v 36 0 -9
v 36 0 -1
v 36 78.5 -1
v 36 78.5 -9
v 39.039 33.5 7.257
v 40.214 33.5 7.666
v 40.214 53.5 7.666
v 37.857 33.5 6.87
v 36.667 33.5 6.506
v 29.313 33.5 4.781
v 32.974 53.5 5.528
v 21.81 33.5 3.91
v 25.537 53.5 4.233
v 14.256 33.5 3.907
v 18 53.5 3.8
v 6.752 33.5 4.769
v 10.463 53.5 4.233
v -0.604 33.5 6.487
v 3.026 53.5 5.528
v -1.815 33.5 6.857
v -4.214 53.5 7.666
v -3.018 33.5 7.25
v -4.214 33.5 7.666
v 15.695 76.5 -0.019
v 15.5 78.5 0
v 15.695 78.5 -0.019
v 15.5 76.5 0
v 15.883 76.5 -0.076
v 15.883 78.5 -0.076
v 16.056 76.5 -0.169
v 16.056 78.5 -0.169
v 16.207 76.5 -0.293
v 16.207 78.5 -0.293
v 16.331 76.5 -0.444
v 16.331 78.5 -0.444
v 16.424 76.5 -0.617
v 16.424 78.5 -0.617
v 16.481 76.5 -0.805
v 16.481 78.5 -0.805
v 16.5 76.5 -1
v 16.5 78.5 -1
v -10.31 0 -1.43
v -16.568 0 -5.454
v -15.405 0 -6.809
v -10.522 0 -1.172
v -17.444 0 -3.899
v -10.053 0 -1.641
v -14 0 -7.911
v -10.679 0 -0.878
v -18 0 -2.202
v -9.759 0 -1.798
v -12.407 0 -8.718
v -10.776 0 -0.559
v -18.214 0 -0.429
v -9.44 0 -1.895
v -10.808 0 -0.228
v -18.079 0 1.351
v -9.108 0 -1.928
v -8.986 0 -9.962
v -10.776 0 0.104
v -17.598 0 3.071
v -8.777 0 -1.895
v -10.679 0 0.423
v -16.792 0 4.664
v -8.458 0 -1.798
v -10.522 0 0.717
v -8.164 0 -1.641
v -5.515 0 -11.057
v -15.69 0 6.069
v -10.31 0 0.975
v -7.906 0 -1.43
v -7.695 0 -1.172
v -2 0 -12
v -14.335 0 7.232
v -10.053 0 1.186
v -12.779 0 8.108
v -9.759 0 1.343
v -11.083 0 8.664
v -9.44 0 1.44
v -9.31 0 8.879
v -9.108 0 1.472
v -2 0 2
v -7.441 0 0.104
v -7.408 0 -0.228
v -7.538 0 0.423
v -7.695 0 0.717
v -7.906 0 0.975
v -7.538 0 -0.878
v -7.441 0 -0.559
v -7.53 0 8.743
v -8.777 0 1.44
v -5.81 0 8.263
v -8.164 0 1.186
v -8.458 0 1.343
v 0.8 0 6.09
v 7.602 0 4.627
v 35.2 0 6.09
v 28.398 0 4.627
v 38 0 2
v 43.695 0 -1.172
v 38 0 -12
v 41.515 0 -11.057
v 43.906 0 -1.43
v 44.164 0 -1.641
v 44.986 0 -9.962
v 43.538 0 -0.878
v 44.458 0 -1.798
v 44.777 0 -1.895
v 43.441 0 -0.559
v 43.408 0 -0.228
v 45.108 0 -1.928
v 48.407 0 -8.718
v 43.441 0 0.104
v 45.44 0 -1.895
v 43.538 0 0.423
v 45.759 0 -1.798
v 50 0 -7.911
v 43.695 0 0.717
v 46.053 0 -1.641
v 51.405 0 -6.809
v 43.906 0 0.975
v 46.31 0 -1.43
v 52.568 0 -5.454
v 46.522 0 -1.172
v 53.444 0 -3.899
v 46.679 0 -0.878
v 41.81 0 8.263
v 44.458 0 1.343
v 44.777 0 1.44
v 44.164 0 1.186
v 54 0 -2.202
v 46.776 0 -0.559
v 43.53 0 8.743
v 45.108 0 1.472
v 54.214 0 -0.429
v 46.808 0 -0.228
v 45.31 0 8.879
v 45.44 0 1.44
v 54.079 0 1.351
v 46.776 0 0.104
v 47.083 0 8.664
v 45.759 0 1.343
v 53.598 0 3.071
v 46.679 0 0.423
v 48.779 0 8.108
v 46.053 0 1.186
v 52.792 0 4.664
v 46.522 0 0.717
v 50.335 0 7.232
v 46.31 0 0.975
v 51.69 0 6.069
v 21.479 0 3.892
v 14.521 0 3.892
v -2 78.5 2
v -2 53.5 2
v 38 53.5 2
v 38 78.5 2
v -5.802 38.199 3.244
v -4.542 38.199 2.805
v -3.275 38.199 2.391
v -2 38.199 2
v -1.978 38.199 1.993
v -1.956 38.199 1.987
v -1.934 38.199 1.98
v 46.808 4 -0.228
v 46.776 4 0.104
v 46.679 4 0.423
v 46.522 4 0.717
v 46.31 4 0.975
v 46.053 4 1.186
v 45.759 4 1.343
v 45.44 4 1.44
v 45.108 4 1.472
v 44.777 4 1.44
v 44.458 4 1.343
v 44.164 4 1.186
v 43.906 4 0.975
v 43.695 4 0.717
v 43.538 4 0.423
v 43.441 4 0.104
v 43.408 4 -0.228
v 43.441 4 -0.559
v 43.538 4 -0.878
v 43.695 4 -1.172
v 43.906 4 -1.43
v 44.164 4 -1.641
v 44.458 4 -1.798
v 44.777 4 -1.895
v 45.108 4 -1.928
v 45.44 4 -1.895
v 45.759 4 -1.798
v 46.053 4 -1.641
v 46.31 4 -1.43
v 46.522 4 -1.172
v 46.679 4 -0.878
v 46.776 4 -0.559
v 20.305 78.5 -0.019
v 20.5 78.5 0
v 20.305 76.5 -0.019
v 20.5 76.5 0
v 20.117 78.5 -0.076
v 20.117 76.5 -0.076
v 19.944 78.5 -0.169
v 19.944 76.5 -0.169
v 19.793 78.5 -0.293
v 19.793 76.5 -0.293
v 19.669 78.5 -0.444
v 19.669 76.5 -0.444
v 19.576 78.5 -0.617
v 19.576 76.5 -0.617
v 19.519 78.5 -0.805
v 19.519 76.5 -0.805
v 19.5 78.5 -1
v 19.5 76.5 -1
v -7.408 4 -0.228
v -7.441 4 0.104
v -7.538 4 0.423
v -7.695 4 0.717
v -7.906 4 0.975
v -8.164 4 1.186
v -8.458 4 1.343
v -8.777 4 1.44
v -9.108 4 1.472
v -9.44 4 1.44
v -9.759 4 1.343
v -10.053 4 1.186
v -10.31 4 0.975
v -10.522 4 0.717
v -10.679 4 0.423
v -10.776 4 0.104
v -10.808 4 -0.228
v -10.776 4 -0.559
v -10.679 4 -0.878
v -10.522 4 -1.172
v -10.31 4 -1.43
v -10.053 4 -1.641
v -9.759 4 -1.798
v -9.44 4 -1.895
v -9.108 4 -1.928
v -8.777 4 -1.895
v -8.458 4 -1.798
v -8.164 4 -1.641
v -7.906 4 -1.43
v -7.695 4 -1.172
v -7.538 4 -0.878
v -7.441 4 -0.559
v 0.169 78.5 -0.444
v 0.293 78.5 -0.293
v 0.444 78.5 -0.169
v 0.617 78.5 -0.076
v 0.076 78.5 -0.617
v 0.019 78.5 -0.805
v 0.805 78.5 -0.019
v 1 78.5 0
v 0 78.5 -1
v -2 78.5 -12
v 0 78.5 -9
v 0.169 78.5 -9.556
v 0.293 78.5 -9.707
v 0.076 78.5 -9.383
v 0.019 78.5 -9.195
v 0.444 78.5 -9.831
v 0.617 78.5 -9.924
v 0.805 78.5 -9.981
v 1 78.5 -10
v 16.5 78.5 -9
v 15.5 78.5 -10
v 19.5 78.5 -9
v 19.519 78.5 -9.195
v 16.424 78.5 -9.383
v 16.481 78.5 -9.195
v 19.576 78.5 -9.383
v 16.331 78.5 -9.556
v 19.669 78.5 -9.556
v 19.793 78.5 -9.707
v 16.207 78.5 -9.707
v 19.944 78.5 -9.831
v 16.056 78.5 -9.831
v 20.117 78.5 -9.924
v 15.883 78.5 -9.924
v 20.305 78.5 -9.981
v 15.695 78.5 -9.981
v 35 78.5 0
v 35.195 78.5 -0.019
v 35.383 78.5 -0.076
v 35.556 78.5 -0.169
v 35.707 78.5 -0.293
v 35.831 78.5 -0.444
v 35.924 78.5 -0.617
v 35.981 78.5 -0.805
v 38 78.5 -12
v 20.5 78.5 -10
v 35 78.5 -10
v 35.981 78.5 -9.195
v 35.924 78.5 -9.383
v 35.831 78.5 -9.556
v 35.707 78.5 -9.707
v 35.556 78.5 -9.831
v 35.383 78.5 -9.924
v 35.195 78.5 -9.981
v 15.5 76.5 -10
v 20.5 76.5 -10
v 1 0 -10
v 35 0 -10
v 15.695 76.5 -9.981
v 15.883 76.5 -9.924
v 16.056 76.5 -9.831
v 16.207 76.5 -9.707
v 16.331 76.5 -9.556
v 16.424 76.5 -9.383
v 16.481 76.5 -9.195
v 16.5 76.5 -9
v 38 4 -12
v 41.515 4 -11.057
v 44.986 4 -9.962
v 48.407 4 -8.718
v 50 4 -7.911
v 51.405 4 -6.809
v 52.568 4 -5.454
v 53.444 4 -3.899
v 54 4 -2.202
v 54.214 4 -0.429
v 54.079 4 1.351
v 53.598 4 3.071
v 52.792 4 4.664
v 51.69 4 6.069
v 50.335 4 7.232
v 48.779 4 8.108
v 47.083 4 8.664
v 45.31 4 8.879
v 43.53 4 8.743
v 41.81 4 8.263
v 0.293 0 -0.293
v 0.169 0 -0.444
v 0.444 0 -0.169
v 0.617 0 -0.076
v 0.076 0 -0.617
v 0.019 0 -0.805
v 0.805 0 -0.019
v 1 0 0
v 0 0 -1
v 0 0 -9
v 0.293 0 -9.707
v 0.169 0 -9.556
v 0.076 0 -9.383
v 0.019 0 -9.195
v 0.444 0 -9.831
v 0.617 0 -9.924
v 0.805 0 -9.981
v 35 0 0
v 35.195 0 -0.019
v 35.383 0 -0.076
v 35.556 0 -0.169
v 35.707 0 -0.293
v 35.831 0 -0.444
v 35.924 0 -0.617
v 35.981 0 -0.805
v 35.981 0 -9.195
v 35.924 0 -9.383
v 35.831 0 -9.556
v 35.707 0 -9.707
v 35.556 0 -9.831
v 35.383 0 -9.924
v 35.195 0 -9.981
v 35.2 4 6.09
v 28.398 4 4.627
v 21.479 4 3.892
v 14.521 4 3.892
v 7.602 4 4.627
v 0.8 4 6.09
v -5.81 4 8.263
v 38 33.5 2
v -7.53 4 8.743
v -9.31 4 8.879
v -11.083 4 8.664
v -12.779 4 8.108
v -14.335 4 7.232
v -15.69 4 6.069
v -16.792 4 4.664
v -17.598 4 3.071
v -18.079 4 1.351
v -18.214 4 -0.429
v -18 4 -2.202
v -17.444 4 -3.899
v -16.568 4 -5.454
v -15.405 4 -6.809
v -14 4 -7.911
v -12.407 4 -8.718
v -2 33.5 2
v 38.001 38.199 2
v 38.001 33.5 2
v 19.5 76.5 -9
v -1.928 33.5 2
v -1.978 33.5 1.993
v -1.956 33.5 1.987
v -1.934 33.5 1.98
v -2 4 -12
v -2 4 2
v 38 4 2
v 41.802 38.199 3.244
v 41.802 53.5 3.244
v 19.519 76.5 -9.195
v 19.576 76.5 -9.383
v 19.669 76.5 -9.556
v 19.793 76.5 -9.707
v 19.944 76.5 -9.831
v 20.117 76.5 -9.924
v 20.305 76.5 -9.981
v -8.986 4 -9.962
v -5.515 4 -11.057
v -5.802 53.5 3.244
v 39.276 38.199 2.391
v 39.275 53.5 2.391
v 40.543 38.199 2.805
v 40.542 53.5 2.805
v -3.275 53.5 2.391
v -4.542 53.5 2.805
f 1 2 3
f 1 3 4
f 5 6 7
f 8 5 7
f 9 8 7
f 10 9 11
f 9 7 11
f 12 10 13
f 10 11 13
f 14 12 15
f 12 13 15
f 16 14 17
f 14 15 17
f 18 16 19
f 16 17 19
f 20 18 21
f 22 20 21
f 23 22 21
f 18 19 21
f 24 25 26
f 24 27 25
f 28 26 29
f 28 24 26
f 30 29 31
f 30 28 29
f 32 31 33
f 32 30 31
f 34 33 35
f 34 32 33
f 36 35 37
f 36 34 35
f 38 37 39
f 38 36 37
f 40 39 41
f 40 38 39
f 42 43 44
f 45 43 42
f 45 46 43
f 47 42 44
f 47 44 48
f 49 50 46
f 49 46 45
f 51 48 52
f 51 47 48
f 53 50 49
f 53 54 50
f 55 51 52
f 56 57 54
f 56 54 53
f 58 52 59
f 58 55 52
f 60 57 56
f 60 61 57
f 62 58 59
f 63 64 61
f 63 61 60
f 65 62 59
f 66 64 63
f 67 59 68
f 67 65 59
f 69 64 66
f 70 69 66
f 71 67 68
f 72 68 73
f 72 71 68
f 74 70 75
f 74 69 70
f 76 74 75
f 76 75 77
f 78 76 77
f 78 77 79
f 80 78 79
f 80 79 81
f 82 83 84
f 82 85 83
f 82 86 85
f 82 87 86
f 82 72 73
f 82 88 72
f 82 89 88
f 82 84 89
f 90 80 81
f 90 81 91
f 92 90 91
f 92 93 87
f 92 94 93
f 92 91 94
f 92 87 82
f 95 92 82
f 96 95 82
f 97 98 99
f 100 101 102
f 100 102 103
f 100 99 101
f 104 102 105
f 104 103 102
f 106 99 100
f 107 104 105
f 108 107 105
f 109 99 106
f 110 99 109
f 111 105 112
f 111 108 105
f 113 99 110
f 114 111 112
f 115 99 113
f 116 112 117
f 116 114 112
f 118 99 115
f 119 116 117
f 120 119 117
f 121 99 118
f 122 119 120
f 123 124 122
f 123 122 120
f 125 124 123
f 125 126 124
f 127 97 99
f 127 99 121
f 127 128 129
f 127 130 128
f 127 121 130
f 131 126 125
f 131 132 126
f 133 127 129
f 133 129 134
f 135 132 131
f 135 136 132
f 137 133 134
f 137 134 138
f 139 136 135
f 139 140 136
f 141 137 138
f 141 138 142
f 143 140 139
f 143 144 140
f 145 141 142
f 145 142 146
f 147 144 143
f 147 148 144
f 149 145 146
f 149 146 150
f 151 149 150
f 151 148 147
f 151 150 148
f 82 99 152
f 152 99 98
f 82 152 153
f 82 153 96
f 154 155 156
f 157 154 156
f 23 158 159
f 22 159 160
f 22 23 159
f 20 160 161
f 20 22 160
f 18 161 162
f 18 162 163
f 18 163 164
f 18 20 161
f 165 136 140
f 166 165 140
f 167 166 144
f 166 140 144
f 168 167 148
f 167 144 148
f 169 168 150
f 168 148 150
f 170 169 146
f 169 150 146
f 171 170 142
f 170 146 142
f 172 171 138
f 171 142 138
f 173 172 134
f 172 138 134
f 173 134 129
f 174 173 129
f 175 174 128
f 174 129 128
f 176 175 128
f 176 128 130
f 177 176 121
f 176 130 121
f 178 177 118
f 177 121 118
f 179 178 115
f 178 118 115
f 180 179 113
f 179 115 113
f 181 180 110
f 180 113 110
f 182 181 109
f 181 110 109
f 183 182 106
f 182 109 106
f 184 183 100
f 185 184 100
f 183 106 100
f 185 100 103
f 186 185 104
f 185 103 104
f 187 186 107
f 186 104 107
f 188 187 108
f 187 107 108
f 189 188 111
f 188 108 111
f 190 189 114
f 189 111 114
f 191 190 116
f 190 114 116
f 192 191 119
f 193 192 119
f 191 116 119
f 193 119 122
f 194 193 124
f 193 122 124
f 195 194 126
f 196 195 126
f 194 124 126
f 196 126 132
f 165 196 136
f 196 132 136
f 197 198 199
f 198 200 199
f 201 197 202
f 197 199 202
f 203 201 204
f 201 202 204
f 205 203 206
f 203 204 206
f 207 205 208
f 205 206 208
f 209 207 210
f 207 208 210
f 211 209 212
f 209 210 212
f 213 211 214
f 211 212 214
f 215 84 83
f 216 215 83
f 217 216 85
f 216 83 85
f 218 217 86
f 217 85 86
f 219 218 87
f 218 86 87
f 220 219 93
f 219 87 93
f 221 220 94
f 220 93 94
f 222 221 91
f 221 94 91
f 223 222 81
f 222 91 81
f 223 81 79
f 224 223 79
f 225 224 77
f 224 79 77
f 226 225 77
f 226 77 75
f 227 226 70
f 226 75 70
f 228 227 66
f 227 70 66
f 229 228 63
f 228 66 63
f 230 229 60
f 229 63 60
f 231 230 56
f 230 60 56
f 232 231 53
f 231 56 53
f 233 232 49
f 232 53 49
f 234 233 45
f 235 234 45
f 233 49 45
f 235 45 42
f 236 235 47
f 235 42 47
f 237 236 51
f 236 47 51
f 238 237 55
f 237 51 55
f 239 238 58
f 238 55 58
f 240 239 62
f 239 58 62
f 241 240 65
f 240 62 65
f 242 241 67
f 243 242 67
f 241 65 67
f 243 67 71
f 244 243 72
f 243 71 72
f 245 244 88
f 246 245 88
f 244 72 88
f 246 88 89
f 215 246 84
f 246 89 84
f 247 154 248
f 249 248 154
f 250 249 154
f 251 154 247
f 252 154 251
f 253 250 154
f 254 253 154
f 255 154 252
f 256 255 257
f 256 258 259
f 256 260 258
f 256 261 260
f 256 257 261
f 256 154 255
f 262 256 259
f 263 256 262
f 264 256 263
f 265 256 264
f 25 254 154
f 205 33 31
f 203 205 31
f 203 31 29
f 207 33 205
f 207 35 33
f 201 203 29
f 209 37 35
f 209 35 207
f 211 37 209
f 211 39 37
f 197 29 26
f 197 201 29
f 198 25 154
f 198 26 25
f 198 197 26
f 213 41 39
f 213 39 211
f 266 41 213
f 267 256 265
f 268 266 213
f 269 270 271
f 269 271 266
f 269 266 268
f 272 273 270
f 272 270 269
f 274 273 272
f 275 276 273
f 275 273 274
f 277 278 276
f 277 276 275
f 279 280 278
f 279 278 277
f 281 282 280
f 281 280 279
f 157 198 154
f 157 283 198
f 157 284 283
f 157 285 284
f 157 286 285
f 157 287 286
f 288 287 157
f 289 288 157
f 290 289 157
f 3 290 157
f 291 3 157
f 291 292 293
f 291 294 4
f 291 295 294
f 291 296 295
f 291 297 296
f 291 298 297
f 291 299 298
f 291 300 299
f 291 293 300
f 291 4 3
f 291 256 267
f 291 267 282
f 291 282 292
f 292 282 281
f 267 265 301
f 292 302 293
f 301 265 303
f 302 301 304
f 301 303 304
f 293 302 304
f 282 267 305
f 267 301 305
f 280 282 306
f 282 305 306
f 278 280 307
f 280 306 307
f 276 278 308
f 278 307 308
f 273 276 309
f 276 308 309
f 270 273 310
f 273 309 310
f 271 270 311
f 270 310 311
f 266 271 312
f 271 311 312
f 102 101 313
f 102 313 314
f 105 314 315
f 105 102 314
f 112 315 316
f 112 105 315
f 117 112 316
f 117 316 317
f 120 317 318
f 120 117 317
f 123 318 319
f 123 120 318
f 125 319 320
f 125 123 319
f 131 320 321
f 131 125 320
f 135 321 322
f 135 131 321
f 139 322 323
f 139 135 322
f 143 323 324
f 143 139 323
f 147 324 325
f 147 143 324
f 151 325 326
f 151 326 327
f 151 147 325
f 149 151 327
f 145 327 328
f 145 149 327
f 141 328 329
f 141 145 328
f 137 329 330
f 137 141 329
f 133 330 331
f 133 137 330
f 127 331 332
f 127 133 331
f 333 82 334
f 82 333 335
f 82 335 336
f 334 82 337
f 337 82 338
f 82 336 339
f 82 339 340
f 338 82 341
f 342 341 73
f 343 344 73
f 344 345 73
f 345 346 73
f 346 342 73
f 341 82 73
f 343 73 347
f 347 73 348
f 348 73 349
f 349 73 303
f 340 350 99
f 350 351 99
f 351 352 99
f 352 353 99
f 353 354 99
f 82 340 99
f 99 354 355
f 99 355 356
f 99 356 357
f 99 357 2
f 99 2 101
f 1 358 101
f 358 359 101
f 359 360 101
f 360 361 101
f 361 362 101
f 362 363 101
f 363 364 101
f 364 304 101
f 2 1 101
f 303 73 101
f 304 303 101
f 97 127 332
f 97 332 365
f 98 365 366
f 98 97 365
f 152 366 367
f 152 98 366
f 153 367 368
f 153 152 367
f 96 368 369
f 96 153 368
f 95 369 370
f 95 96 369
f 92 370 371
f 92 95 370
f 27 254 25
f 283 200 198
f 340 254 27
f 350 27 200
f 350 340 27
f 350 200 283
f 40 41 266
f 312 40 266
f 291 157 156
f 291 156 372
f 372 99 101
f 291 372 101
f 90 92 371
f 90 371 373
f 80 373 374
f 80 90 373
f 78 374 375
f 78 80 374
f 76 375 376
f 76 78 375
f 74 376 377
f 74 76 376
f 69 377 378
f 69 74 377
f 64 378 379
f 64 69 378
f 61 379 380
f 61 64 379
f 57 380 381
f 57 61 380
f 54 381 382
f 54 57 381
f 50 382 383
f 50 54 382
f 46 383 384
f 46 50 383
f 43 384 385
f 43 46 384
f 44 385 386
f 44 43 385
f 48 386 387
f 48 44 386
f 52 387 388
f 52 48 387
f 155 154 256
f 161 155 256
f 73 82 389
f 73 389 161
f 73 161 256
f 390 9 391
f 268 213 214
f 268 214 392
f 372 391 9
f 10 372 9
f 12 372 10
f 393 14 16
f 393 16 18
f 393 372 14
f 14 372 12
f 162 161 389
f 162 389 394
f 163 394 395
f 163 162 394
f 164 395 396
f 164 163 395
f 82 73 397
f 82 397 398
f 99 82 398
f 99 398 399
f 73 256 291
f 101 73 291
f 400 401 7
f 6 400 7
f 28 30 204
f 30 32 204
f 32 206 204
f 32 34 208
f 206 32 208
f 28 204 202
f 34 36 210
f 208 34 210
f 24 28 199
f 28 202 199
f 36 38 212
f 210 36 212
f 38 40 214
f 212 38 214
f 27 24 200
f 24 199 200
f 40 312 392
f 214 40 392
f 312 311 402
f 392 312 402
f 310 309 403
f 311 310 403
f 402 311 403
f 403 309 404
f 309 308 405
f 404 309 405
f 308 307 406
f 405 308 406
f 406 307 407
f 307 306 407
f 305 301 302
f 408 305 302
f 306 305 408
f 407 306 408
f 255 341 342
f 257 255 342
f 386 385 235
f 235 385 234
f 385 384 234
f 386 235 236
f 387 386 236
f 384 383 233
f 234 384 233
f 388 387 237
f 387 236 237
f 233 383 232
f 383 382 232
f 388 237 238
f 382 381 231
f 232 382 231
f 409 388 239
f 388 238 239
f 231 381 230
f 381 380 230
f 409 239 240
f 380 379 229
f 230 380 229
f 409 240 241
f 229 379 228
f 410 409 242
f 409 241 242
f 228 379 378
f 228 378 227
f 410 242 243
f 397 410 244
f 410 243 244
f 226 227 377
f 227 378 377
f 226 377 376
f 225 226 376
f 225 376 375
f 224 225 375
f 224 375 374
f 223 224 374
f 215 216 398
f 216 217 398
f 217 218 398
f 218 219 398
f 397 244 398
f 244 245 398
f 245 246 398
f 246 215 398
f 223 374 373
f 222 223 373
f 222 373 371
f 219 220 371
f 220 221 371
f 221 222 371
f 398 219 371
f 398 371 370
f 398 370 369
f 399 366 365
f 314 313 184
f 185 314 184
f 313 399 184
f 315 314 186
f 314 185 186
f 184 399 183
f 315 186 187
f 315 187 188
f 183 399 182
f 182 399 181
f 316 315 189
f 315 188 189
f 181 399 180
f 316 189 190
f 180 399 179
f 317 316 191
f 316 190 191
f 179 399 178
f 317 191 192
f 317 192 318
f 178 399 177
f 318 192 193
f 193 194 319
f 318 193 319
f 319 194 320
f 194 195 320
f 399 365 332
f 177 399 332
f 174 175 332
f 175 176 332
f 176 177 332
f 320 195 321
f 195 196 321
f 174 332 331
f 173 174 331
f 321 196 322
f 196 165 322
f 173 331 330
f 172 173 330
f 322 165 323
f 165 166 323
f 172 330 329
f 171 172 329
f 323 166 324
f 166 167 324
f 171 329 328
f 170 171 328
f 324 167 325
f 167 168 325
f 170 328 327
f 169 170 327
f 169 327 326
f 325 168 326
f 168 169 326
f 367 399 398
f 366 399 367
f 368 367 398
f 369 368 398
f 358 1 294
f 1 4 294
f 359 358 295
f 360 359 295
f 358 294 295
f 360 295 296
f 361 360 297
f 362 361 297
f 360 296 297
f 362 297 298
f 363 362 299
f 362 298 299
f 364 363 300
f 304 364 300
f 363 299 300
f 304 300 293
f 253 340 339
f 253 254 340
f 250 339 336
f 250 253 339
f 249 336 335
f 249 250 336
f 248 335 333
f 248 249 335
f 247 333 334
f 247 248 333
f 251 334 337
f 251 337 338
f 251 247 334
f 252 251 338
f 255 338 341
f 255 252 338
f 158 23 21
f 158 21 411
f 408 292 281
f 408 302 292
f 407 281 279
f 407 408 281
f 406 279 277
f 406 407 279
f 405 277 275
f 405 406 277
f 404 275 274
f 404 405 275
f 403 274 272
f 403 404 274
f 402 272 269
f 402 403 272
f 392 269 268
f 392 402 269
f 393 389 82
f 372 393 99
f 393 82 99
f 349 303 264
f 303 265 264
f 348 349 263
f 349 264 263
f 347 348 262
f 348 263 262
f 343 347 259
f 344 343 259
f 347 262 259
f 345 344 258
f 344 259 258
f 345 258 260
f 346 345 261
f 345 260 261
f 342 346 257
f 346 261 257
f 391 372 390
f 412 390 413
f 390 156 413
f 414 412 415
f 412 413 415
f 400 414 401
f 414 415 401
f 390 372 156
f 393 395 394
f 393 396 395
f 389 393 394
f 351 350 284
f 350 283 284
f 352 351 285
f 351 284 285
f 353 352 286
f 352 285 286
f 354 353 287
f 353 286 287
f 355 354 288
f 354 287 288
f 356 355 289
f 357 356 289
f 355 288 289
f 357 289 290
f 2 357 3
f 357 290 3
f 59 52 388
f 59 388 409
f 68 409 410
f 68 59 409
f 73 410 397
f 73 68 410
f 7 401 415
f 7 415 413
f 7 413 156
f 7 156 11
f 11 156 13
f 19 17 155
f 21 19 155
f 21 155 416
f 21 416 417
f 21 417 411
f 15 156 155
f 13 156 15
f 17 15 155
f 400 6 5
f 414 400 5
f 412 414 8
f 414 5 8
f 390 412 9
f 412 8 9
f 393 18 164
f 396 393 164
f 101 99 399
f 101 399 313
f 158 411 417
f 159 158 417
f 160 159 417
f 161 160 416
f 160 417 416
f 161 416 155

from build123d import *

# Parameters (mm, degrees)
SKETCH1_W                    = 40
SKETCH1_H                    = 14
SKETCH1_W_2                  = 36
SKETCH1_H_2                  = 10
BOSS_EXTRUDE1_DEPTH          = 78.5
SKETCH2_W                    = 3
SKETCH2_H                    = 10
BOSS_EXTRUDE2_DEPTH          = 2
BOSS_EXTRUDE7_START          = -25
BOSS_EXTRUDE7_DEPTH          = 20
CUT_REVOLVE1_ANGLE           = 323.76
CUT_REVOLVE1_OTHER_WAY_ANGLE = 3.31
SKETCH20_R                   = 1.7
BOSS_EXTRUDE8_DEPTH          = 4
FILLET1_R                    = 1


with BuildPart() as part:
    # Sketch1 → Boss-Extrude1 (new body)
    with BuildSketch(Plane(origin=(0, 0, 0), x_dir=(1, 0, 0), z_dir=(0, 1, 0))):
        with Locations((18, 5)):
            Rectangle(SKETCH1_W, SKETCH1_H)
        with Locations((18, 5)):
            Rectangle(SKETCH1_W_2, SKETCH1_H_2, mode=Mode.SUBTRACT)
    extrude(amount=BOSS_EXTRUDE1_DEPTH)

    # Sketch2 → Boss-Extrude2 (add)
    with BuildSketch(Plane(origin=(0, 78.5, 0), x_dir=(1, 0, 0), z_dir=(0, 1, 0))):
        with Locations((18, 5)):
            Rectangle(SKETCH2_W, SKETCH2_H)
    extrude(amount=-BOSS_EXTRUDE2_DEPTH)

    # Sketch17 → Boss-Extrude7 (add)
    with BuildSketch(Plane(origin=(0, 78.5, 0), x_dir=(1, 0, 0), z_dir=(0, 1, 0)).offset(BOSS_EXTRUDE7_START)):
        with BuildLine():
            Line((-4.214182636, -7.666297866), (-5.801637028, -3.244008002))
            ThreePointArc((-5.801637028, -3.244008002), (-3.909649485, -2.595016918), (-2, -2))
            Line((-2, -2), (38, -2))
            ThreePointArc((38, -2), (39.909649485, -2.595016918), (41.801637028, -3.244008002))
            Line((41.801637028, -3.244008002), (40.214182636, -7.666297866))
            ThreePointArc((40.214182636, -7.666297866), (18, -3.8), (-4.214182636, -7.666297866))
        make_face()
    extrude(amount=-BOSS_EXTRUDE7_DEPTH)

    # Sketch19 → Cut-Revolve1 (revolve, cut)
    with BuildSketch(Plane(origin=(-6.170956479, 0, 2.215167315), x_dir=(0.337858291, 0, 0.941196991), z_dir=(-0.941196991, 0, 0.337858291))):
        Polygon((1.093119398, 38.198580539), (5.791699937, 33.5), (1.093119398, 33.5), align=None)
    revolve(axis=Axis((18, 33.5, 69.55), (0, 1, 0)), revolution_arc=CUT_REVOLVE1_ANGLE, mode=Mode.SUBTRACT)

    # Sketch19 → Cut-Revolve1 other way (revolve, cut)
    with BuildSketch(Plane(origin=(-6.170956479, 0, 2.215167315), x_dir=(0.337858291, 0, 0.941196991), z_dir=(-0.941196991, 0, 0.337858291))):
        Polygon((1.093119398, 38.198580539), (5.791699937, 33.5), (1.093119398, 33.5), align=None)
    revolve(axis=Axis((18, 33.5, 69.55), (0, -1, 0)), revolution_arc=CUT_REVOLVE1_OTHER_WAY_ANGLE, mode=Mode.SUBTRACT)

    # Fillet1
    fillet1_edges = [part.edges().sort_by_distance(p)[0] for p in [
        (0, 39.25, -10),
        (0, 39.25, 0),
        (36, 39.25, 0),
        (36, 39.25, -10),
        (19.5, 77.5, -10),
        (19.5, 77.5, 0),
        (16.5, 77.5, 0),
        (16.5, 77.5, -10),
    ]]
    fillet(fillet1_edges, radius=FILLET1_R)


with BuildPart() as body_2:
    # Sketch20 → Boss-Extrude8 (new body)
    with BuildSketch(Plane.XZ):
        with BuildLine():
            ThreePointArc((38, -12), (43.256739188, -10.528084552), (48.406726055, -8.717704135))
            ThreePointArc((48.406726055, -8.717704135), (53.598475523, 3.070822505), (41.809948883, 8.262571973))
            ThreePointArc((41.809948883, 8.262571973), (18, 3.8), (-5.809948883, 8.262571973))
            ThreePointArc((-5.809948883, 8.262571973), (-17.598475523, 3.070822505), (-12.406726055, -8.717704135))
            ThreePointArc((-12.406726055, -8.717704135), (-7.256739188, -10.528084552), (-2, -12))
            Line((-2, -12), (-2, 2))
            Line((-2, 2), (38, 2))
            Line((38, 2), (38, -12))
        make_face()
        with Locations((-9.108337469, -0.227566081)):
            Circle(SKETCH20_R, mode=Mode.SUBTRACT)
        with Locations((45.108337469, -0.227566081)):
            Circle(SKETCH20_R, mode=Mode.SUBTRACT)
    extrude(amount=-BOSS_EXTRUDE8_DEPTH)


solid = Compound([part.part, body_2.part])
